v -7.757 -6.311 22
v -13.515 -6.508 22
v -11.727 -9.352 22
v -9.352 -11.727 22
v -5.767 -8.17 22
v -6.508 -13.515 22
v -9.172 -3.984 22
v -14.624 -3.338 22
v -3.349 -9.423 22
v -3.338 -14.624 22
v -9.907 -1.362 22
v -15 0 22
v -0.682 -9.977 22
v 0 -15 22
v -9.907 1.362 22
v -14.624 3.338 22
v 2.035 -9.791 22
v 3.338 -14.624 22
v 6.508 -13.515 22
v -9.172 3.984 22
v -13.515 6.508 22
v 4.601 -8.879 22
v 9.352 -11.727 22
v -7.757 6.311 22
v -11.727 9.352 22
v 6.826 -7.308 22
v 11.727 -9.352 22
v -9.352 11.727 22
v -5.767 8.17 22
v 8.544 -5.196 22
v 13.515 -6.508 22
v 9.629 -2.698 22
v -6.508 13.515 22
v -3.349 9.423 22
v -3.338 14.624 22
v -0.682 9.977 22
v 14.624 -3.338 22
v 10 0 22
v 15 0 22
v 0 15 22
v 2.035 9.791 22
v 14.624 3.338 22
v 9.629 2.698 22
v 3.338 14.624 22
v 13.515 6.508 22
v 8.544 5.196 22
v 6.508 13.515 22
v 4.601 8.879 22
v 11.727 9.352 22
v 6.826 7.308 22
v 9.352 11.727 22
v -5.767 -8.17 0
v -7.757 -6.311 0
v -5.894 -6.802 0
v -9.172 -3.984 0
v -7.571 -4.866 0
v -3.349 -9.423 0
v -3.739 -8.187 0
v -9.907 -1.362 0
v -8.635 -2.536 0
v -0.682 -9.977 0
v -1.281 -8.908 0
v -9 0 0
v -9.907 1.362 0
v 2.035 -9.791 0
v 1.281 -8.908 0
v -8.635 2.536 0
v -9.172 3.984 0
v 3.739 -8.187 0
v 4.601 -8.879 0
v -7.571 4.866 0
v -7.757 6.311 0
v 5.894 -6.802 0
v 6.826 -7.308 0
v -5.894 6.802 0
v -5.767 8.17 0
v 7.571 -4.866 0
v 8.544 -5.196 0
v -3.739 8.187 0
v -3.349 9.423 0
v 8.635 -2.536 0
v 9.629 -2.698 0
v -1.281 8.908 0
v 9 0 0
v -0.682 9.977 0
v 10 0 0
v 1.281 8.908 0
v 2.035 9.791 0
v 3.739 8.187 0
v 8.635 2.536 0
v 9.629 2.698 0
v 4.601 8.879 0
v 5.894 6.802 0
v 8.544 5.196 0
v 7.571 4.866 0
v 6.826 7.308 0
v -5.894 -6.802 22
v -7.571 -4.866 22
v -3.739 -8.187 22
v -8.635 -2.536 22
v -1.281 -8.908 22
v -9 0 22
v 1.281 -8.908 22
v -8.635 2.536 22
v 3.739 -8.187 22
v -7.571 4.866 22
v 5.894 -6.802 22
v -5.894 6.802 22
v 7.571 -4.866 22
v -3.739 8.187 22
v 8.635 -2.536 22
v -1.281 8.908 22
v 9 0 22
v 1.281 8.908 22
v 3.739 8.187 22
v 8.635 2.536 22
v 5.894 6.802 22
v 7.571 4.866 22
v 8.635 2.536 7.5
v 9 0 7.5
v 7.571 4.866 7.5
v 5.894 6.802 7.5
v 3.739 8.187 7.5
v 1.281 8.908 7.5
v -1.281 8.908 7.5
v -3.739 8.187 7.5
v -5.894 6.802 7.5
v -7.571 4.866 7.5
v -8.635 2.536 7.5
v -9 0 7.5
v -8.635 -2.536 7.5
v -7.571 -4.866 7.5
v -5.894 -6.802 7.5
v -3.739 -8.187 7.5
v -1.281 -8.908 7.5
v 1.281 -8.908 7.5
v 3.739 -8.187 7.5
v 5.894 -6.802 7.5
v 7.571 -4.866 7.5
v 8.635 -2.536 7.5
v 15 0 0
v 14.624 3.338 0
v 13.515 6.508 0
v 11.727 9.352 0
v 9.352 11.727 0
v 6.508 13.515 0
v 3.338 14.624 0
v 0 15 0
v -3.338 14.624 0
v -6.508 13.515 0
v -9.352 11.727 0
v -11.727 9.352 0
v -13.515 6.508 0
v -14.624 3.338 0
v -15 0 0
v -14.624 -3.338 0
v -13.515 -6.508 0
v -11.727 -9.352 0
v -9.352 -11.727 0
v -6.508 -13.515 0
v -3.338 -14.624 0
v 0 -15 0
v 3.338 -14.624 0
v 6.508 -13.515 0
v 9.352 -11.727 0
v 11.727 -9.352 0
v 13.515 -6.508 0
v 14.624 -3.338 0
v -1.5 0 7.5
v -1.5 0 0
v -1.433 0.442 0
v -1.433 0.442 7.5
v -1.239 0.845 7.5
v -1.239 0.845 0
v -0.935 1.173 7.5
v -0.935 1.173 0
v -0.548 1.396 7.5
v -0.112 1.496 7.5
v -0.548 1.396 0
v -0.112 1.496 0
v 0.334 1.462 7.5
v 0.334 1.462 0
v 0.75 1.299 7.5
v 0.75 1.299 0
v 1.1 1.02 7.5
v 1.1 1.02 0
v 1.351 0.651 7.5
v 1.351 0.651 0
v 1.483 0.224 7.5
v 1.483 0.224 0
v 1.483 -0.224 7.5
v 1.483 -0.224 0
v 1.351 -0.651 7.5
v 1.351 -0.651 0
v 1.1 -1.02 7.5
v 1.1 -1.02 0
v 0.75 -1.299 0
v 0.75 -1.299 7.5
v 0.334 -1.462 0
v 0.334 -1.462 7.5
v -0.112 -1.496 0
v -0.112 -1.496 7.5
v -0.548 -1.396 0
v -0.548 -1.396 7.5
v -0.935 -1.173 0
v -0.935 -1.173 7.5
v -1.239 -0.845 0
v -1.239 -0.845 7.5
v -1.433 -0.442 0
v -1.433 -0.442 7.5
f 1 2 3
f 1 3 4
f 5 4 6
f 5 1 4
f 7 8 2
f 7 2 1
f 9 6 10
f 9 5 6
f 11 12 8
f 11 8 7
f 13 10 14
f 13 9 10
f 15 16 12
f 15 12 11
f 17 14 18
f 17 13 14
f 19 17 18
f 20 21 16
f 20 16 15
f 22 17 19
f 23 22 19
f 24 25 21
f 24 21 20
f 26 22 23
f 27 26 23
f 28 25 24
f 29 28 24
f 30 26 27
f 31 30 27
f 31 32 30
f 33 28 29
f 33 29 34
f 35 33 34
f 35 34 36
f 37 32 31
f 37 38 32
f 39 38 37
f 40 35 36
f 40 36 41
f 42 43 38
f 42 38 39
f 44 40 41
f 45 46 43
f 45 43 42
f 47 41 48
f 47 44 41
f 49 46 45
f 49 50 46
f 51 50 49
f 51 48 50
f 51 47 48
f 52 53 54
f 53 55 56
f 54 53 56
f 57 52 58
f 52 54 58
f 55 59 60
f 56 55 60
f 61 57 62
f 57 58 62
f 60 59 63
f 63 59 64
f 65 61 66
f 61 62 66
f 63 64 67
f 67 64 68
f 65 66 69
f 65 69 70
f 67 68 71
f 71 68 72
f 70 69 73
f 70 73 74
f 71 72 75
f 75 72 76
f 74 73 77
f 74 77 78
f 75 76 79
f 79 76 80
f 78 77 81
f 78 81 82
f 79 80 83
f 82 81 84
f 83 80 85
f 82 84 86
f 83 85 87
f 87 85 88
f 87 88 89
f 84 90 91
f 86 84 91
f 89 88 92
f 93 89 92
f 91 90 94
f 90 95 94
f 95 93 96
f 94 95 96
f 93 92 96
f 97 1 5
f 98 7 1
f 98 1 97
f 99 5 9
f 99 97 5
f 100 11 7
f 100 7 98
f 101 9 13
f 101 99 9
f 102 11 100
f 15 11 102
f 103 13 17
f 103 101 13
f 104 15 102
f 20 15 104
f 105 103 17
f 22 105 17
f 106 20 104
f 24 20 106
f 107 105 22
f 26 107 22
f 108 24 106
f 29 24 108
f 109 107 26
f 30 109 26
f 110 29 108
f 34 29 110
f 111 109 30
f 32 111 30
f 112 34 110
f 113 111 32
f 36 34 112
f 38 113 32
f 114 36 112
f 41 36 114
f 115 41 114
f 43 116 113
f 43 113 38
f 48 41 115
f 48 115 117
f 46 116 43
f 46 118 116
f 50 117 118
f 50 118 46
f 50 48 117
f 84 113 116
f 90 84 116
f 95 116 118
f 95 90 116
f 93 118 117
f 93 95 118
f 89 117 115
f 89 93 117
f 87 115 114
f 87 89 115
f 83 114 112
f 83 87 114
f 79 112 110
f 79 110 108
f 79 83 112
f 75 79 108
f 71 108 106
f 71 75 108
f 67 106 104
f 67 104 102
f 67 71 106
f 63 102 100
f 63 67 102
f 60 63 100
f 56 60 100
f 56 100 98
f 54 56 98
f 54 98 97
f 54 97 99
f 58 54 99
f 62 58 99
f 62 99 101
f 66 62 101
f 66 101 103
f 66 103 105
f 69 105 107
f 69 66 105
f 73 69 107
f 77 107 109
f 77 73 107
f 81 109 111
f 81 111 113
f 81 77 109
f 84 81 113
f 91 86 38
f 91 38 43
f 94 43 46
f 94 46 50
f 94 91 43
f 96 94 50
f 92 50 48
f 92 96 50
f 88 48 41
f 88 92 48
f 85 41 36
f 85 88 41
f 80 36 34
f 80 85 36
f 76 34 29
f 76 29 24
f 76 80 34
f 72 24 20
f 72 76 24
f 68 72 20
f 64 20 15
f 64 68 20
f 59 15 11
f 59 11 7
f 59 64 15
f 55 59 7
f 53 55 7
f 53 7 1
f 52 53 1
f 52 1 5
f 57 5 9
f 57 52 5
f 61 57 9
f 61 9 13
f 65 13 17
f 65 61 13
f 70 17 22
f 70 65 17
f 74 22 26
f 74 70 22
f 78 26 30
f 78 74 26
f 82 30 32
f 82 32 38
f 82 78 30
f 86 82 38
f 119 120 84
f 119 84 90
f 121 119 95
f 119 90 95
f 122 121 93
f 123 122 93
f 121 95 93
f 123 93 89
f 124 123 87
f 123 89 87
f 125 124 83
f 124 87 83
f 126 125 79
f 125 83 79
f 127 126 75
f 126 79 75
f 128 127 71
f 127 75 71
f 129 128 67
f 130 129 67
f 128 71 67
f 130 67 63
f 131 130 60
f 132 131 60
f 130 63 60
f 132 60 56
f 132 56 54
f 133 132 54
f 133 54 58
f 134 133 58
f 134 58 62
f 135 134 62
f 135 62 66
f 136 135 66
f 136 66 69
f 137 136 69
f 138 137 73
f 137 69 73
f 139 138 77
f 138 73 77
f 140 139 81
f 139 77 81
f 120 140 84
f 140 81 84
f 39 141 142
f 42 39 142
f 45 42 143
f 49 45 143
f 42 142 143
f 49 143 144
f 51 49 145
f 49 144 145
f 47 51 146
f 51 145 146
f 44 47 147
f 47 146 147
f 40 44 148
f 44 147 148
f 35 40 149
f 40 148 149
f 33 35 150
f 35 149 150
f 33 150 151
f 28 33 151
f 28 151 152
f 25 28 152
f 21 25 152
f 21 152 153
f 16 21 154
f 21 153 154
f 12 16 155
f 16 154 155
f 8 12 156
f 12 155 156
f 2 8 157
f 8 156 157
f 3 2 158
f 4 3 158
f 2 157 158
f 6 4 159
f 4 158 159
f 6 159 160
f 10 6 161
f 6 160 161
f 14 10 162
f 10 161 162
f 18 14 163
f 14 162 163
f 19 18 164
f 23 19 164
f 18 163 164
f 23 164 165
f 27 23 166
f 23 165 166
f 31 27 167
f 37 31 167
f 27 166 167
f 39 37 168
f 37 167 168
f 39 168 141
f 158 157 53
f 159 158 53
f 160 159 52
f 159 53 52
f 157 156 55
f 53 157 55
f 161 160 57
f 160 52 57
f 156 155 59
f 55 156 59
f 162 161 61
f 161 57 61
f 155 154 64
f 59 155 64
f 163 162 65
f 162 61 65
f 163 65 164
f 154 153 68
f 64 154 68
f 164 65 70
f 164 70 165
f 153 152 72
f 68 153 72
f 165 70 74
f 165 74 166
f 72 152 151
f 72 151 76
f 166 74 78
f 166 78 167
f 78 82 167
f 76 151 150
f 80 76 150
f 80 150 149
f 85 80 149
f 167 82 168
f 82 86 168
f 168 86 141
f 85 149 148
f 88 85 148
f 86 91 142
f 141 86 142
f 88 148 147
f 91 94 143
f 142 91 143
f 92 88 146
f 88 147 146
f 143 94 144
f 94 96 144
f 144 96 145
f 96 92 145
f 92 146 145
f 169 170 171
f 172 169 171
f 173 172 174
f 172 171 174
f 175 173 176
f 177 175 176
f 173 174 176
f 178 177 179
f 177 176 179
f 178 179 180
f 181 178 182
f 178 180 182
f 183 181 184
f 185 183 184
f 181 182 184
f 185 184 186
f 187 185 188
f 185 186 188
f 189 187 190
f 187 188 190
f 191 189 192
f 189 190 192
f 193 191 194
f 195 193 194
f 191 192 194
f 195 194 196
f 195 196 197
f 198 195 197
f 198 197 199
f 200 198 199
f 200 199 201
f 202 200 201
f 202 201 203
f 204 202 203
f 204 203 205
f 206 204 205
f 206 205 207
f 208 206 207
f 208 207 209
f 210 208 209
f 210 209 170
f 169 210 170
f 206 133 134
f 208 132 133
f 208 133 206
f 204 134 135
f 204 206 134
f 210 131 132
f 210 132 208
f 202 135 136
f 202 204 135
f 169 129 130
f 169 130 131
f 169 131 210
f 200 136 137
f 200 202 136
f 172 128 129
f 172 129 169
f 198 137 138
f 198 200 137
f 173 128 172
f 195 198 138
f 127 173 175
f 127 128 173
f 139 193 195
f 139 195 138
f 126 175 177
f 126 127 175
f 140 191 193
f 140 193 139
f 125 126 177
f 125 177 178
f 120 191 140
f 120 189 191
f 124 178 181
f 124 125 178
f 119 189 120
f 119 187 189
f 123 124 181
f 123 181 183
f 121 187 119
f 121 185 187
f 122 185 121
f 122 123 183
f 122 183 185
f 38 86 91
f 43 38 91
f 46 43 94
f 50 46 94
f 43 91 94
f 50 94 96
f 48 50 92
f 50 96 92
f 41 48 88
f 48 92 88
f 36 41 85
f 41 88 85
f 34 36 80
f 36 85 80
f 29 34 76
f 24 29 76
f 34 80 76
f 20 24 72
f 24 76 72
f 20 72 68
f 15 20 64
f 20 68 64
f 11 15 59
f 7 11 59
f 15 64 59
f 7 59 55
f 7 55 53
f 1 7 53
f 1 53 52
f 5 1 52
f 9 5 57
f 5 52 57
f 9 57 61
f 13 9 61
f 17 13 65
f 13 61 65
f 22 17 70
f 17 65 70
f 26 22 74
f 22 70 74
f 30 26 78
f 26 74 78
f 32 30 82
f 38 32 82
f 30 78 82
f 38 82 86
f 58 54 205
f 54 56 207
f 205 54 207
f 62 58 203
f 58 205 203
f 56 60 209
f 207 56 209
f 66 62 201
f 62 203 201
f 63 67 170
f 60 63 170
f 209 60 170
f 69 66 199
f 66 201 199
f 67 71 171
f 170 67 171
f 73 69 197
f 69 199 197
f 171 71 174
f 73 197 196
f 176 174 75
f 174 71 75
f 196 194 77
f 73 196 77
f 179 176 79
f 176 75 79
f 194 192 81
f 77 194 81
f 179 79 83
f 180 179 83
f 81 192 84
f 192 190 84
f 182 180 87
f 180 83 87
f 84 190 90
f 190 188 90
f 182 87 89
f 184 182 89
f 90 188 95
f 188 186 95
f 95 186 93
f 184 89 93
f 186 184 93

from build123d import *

# Parameters (mm, degrees)
ESQUISSE1_R             = 15
ESQUISSE1_R_2           = 10
BOSS_EXTRU_1_DEPTH      = 22
ESQUISSE1_3_R           = 10
ESQUISSE1_3_R_2         = 9
BOSS_EXTRU_2_DEPTH      = 22
ESQUISSE1_4_R           = 9
BOSS_EXTRU_3_DEPTH      = 7.5
ESQUISSE2_R             = 1.5
ENL_V_MAT_EXTRU_1_DEPTH = 31.56141358


with BuildPart() as part:
    # Esquisse1 → Boss.-Extru.1 (new body)
    with BuildSketch(Plane.XY):
        Circle(ESQUISSE1_R)
        Circle(ESQUISSE1_R_2, mode=Mode.SUBTRACT)
    extrude(amount=BOSS_EXTRU_1_DEPTH)


with BuildPart() as body_2:
    # Esquisse1<3> → Boss.-Extru.2 (new body)
    with BuildSketch(Plane.XY):
        Circle(ESQUISSE1_3_R)
        Circle(ESQUISSE1_3_R_2, mode=Mode.SUBTRACT)
    extrude(amount=BOSS_EXTRU_2_DEPTH)


with BuildPart() as body_3:
    # Esquisse1<4> → Boss.-Extru.3 (new body)
    with BuildSketch(Plane.XY):
        Circle(ESQUISSE1_4_R)
    extrude(amount=BOSS_EXTRU_3_DEPTH)

    # Esquisse2 → Enlèv. mat.-Extru.1 (cut, through all)
    with BuildSketch(Plane(origin=(0, 0, 0), x_dir=(-1, 0, 0), z_dir=(0, 0, -1))):
        Circle(ESQUISSE2_R)
    extrude(amount=-ENL_V_MAT_EXTRU_1_DEPTH, mode=Mode.SUBTRACT)


solid = Compound([part.part, body_2.part, body_3.part])
